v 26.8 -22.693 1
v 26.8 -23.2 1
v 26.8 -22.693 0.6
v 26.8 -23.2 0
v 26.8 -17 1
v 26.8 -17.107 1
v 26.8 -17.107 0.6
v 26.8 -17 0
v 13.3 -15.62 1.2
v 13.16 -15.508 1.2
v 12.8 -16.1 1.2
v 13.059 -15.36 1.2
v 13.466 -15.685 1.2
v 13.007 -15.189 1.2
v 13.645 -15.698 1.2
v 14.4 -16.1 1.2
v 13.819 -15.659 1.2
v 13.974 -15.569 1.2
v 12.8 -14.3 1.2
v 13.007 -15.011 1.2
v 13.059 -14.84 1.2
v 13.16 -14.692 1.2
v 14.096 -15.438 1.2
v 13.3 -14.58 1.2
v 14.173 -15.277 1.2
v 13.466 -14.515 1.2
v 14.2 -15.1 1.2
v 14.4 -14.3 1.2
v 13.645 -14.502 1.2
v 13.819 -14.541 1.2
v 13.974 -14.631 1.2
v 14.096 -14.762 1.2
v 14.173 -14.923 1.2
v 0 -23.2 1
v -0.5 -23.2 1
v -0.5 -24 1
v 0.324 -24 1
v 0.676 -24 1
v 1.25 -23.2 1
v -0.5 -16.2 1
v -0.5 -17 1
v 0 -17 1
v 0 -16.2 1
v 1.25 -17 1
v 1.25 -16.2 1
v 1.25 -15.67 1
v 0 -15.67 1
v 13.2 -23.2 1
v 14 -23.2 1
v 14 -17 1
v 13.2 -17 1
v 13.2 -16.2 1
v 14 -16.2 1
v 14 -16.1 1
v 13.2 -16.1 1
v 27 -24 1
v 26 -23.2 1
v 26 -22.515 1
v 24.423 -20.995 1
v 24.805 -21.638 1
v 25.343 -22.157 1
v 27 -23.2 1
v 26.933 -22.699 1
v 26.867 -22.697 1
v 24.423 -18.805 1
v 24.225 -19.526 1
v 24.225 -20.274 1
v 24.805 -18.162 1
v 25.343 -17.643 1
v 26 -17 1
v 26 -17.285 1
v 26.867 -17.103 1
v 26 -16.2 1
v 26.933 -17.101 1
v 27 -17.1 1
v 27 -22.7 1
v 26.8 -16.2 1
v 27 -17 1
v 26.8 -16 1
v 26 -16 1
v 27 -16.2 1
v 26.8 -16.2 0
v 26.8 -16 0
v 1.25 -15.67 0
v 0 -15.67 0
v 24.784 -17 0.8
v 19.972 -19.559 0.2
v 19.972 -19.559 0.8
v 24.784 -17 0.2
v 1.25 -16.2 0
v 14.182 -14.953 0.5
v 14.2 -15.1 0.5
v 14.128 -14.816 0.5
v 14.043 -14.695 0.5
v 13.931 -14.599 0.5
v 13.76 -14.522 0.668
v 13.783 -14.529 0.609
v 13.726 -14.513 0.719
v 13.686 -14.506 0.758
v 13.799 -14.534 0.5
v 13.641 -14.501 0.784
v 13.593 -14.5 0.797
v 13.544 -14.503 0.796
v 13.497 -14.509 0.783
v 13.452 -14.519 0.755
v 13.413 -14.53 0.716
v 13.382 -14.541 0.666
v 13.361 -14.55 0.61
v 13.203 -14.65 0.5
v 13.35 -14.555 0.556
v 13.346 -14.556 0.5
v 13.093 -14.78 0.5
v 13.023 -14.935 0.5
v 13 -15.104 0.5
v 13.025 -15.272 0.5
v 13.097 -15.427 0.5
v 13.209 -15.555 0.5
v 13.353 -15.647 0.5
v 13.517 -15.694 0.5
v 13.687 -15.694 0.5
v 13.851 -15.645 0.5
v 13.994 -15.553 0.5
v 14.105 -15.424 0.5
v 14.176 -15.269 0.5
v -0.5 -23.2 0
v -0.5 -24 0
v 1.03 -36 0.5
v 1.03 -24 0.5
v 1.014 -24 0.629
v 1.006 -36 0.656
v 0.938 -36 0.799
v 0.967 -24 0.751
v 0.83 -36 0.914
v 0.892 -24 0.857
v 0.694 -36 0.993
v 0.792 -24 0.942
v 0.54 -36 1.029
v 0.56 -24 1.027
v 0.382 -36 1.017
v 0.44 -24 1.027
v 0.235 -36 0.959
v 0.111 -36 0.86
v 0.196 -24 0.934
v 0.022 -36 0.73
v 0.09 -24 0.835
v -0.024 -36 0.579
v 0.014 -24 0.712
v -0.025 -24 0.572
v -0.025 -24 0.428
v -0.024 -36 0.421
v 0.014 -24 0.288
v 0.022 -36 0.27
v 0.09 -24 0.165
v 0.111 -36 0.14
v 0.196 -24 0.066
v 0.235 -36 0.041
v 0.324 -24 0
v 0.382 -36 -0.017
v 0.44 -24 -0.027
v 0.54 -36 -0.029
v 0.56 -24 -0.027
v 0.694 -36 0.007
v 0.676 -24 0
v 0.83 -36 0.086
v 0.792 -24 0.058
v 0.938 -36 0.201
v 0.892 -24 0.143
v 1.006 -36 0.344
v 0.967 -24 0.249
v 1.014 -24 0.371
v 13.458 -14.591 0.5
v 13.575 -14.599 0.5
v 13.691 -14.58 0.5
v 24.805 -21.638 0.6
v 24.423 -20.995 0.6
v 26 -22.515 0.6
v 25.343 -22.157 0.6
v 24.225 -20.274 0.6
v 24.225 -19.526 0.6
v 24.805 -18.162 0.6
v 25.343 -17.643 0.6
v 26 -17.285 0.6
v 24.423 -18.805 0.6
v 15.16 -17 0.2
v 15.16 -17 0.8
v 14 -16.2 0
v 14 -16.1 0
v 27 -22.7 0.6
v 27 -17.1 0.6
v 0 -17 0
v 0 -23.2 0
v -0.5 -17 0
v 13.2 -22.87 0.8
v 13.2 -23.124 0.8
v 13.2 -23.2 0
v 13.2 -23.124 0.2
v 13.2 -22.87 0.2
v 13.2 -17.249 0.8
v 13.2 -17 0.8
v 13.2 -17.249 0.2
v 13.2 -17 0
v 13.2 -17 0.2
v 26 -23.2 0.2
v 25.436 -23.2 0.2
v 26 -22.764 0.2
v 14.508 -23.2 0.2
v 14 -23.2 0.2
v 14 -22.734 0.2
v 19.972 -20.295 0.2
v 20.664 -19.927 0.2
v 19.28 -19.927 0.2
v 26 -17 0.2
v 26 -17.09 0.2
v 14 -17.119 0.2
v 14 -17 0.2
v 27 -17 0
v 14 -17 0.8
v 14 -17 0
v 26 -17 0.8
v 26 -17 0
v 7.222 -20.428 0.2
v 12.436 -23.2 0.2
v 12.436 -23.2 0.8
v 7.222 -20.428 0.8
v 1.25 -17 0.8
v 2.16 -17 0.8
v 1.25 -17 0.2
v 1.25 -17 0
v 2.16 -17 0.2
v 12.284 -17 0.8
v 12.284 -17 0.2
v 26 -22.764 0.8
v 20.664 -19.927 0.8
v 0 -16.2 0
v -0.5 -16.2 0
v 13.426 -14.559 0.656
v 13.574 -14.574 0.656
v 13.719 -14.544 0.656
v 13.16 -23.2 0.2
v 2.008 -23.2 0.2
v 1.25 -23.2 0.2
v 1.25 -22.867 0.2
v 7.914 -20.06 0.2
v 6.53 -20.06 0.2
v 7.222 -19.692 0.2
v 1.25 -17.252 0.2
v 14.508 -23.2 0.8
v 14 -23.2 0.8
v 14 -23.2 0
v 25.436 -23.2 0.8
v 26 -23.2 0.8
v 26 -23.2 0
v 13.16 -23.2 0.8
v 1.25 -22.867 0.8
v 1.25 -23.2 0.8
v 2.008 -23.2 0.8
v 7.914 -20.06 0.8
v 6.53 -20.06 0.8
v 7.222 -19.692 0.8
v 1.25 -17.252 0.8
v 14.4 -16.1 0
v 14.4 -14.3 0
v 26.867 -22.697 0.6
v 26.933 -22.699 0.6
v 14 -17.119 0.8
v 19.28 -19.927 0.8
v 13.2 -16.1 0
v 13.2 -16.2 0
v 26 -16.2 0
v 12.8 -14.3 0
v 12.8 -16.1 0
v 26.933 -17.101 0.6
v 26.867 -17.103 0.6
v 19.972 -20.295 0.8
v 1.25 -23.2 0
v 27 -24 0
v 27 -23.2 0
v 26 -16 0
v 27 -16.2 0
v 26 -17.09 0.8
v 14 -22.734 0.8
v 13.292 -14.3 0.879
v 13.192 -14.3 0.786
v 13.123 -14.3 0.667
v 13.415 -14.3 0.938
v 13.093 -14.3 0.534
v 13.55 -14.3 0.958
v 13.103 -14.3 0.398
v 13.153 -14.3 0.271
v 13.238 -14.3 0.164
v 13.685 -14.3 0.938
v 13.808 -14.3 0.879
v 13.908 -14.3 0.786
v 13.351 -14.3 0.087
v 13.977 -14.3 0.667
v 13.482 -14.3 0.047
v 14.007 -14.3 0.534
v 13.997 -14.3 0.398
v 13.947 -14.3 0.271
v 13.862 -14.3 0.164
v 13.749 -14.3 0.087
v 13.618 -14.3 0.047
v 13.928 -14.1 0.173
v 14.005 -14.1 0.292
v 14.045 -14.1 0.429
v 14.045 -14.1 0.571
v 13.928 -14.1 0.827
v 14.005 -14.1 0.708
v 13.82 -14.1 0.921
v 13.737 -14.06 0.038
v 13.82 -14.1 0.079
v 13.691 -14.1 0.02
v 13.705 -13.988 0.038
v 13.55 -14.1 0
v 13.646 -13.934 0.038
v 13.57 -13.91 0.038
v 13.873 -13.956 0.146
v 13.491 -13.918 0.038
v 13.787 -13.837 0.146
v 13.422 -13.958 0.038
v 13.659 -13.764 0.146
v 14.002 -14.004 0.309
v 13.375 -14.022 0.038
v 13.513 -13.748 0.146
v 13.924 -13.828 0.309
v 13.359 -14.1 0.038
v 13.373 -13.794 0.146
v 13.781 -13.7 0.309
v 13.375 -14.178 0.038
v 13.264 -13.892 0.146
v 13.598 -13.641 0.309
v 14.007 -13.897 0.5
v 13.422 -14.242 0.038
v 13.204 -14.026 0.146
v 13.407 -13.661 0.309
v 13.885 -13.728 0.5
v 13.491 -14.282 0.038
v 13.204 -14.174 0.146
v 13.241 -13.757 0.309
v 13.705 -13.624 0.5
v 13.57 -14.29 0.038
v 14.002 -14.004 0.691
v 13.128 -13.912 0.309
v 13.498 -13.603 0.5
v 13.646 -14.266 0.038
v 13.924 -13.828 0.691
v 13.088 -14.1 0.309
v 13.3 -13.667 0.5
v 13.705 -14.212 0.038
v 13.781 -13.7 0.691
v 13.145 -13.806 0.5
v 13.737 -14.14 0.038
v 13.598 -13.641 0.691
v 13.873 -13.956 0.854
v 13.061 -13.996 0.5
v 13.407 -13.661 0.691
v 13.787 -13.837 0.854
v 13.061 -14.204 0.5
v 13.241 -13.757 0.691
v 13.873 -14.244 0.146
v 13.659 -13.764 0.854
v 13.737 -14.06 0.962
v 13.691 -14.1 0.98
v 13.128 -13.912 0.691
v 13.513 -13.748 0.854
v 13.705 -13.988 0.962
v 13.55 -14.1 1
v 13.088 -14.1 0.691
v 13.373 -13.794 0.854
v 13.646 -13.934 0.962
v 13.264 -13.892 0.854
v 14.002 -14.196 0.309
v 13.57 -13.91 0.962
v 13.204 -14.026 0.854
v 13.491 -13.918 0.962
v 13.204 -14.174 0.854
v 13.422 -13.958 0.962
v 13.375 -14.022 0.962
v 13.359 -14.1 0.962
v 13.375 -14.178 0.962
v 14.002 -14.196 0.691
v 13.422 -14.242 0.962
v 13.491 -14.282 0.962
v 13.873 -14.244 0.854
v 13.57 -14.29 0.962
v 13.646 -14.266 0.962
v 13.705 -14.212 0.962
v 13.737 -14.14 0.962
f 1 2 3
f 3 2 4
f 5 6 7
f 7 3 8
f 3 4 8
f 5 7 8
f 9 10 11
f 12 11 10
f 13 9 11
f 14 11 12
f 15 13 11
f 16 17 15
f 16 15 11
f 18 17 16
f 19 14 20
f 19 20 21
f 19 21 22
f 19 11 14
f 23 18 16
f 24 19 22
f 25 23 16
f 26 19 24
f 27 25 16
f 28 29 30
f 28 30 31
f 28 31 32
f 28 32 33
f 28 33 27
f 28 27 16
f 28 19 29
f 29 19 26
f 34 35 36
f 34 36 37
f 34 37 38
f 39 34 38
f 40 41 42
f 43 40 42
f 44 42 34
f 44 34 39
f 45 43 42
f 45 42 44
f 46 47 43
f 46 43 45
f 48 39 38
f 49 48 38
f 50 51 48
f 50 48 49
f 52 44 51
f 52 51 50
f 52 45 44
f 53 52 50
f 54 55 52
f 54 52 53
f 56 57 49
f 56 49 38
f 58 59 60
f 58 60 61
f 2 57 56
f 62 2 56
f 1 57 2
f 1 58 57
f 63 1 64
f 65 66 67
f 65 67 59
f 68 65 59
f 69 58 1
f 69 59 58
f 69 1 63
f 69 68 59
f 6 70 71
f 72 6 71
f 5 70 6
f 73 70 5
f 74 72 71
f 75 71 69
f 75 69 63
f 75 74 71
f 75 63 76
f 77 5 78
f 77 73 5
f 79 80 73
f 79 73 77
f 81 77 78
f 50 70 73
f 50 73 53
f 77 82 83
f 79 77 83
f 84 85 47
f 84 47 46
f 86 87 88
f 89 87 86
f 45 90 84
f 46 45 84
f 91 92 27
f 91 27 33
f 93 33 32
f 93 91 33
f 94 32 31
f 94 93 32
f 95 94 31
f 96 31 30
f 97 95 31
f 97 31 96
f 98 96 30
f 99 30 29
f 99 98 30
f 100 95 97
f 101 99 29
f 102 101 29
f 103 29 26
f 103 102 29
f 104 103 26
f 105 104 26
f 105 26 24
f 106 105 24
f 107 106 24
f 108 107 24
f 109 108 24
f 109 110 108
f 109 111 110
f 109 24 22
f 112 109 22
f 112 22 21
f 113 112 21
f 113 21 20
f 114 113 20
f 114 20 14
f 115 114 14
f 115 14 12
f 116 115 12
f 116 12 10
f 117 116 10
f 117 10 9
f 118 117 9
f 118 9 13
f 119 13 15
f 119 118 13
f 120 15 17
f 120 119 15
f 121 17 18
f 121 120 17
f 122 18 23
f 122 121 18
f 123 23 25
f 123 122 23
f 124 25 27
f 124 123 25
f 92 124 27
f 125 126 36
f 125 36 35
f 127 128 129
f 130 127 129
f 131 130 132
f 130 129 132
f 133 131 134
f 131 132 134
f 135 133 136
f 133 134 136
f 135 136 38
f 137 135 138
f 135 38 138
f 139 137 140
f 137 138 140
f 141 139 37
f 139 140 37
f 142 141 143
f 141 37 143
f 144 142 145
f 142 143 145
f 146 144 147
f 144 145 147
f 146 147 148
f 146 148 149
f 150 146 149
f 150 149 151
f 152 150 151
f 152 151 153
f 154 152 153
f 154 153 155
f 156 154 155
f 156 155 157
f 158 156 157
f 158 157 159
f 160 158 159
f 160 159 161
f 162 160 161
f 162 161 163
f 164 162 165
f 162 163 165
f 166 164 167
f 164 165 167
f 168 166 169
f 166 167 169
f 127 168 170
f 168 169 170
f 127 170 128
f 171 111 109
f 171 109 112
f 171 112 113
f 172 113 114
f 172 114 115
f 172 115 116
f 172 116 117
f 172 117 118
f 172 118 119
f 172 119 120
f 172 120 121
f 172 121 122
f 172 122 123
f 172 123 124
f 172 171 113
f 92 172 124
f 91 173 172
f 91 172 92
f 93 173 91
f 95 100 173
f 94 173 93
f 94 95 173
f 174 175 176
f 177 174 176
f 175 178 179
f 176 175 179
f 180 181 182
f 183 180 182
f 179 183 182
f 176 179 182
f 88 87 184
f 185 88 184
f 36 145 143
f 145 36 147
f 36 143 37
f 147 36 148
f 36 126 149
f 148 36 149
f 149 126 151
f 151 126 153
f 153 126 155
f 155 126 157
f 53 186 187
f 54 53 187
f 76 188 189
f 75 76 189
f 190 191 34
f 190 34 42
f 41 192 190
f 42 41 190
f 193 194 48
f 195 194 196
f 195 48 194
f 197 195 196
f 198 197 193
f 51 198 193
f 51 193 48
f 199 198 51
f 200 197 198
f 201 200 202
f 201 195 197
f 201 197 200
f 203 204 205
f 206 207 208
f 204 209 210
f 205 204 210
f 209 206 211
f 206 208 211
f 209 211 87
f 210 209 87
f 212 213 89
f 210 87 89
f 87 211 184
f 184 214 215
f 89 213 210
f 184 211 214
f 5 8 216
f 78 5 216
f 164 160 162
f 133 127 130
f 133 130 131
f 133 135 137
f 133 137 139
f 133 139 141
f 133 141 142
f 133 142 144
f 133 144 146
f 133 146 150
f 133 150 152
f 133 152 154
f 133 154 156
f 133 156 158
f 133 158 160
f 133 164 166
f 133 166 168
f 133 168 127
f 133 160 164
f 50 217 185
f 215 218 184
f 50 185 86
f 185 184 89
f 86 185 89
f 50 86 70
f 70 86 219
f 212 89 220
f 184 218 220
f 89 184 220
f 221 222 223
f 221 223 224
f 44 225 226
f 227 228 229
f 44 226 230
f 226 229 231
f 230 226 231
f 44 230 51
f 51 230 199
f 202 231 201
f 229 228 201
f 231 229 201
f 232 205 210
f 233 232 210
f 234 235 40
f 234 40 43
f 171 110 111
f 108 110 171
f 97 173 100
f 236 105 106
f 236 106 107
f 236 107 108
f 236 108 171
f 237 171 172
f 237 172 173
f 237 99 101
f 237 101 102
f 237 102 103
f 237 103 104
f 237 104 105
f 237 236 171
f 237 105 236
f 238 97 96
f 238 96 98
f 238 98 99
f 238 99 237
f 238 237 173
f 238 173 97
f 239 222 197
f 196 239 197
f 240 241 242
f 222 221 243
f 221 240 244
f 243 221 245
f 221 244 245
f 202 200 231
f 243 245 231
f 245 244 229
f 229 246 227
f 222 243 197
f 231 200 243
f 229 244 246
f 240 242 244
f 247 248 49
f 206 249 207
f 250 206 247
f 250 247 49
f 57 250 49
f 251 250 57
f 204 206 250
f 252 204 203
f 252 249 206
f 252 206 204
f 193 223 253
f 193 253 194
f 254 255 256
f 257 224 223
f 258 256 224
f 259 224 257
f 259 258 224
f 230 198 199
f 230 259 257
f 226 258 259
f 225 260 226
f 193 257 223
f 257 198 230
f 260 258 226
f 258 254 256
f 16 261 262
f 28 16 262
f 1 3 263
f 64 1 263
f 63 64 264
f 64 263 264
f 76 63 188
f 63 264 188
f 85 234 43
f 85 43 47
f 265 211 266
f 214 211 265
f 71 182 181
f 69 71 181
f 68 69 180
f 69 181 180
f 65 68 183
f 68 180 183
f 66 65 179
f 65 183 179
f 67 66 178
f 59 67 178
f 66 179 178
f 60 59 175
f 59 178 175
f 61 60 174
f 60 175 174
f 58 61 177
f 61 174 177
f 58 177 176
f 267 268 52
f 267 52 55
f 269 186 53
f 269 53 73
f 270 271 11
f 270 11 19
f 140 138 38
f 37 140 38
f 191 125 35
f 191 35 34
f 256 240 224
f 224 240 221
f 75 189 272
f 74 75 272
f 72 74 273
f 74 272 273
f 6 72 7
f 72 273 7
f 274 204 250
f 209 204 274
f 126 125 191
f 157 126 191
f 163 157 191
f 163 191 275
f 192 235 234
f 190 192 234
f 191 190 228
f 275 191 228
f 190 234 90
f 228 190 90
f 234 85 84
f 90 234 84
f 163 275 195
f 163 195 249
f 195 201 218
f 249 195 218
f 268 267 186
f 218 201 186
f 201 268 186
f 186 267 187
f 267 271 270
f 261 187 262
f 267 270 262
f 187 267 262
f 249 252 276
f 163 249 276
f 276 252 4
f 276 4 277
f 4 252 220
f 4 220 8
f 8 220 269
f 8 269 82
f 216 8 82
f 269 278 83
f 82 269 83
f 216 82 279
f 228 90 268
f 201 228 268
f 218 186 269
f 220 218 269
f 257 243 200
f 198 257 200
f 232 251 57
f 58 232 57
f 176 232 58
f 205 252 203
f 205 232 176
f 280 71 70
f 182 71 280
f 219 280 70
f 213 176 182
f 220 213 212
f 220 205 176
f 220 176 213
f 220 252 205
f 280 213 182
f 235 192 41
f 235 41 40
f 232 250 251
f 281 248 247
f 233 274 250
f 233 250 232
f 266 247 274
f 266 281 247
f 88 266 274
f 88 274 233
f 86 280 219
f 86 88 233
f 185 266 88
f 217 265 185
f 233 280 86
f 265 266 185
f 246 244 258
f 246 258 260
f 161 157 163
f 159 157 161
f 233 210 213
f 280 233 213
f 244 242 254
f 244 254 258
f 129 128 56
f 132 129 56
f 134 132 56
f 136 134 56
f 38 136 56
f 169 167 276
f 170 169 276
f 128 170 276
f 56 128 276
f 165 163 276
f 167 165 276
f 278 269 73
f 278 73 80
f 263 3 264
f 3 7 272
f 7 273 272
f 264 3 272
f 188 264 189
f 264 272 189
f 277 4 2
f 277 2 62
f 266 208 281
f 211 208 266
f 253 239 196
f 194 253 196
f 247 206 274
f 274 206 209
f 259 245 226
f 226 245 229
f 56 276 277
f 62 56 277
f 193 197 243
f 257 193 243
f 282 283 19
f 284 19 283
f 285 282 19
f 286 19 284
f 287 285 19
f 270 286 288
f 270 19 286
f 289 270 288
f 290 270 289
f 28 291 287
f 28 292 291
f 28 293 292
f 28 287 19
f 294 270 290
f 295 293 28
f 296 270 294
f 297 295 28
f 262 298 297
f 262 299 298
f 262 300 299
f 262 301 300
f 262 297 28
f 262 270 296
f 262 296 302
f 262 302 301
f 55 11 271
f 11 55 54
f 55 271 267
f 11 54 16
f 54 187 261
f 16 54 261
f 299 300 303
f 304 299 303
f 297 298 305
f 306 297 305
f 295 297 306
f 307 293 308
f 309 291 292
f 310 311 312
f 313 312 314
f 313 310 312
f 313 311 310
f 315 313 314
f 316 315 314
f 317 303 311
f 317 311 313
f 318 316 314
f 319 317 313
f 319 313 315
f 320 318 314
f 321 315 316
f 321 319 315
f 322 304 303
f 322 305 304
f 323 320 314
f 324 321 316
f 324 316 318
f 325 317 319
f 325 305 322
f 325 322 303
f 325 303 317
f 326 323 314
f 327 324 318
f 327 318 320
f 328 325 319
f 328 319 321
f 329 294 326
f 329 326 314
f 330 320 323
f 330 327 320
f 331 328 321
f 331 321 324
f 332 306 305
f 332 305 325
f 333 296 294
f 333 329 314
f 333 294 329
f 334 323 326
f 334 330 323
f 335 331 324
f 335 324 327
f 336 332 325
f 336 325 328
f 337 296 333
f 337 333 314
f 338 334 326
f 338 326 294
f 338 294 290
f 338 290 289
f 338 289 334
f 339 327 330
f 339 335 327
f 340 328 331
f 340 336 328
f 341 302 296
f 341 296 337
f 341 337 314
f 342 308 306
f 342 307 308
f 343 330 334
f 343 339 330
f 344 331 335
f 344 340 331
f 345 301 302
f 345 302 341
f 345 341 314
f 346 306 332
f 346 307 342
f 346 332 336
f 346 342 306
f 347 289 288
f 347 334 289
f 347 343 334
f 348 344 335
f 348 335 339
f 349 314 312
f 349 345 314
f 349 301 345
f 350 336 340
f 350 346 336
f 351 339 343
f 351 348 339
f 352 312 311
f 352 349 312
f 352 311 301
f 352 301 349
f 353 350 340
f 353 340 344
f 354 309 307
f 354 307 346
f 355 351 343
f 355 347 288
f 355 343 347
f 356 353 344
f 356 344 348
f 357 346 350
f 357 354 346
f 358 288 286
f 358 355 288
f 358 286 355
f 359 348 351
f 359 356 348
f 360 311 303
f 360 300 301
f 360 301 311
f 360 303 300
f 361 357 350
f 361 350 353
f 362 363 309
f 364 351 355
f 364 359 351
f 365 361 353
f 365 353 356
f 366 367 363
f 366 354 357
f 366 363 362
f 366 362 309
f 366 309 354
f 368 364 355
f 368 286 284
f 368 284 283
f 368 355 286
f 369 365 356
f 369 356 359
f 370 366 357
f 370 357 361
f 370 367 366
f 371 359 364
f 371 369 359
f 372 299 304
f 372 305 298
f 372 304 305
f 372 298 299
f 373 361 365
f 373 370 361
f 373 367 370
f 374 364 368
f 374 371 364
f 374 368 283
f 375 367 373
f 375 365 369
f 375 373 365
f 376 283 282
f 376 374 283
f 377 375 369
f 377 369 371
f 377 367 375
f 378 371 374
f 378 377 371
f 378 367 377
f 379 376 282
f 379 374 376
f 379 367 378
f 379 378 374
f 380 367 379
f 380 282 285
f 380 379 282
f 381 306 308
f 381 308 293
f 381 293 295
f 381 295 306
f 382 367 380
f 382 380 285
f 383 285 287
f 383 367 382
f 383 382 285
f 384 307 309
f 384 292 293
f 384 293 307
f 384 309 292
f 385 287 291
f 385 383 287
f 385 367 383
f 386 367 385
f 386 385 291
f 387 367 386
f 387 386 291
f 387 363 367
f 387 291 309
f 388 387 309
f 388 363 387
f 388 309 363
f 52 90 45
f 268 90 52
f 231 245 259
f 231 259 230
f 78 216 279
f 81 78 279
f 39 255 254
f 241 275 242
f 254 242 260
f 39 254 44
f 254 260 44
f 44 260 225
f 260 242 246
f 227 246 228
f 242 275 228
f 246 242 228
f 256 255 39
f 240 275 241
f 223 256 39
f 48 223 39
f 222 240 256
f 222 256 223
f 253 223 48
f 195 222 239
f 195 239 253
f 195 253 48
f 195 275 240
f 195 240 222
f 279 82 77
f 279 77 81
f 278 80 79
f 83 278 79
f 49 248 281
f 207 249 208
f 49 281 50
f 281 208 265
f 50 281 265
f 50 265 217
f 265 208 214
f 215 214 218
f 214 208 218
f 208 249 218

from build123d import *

# Parameters (mm, degrees)
SKETCH003_W            = 1.25
SKETCH003_H            = 8.33
PAD003_DEPTH           = 1
BOX019_W               = 27.5
BOX019_H               = 0.8
BOX019_DEPTH           = 1
LINEARPATTERN009_COUNT = 2
LINEARPATTERN009_PITCH = 7
BOX022_W               = 0.8
BOX022_H               = 8
BOX022_DEPTH           = 1
BOX021_W               = 0.8
BOX021_H               = 8
BOX021_DEPTH           = 1
BOX020_W               = 0.65
BOX020_H               = 14
BOX020_DEPTH           = 0.6
LINEARPATTERN011_COUNT = 2
LINEARPATTERN011_PITCH = 12.5
BOX023_W               = 0.65
BOX023_H               = 14
BOX023_DEPTH           = 0.6
LINEARPATTERN010_COUNT = 2
LINEARPATTERN010_PITCH = 13
CYLINDER010_R          = 0.53
CYLINDER010_DEPTH      = 12
CYLINDER009_R          = 2.8
CYLINDER009_DEPTH      = 0.4
BOX025_W               = 1.6
BOX025_H               = 1.8
BOX025_DEPTH           = 1.2
CYLINDER011_R          = 0.6
CYLINDER011_DEPTH      = 2
BOX024_W               = 4
BOX024_H               = 6
BOX024_DEPTH           = 1


with BuildPart() as part:
    # Sketch003 → Pad003 (new body)
    with BuildSketch(Plane.XY):
        with Locations((0.625, 4.165)):
            Rectangle(SKETCH003_W, SKETCH003_H)
    extrude(amount=PAD003_DEPTH)

    # Box019 → Box019 (join)
    with BuildSketch(Plane(origin=(-0.5, 0, 0), x_dir=(1, 0, 0), z_dir=(0, 0, 1))):
        with Locations((13.75, 0.4)):
            Rectangle(BOX019_W, BOX019_H)
    box019 = extrude(amount=BOX019_DEPTH)

    # LinearPattern009: Box019 ×2
    with Locations(*[(0, i * LINEARPATTERN009_PITCH, 0) for i in range(1, LINEARPATTERN009_COUNT)]):
        add(box019)

    # Box022 → Box022 (join)
    with BuildSketch(Plane(origin=(13.2, 0, 0), x_dir=(1, 0, 0), z_dir=(0, 0, 1))):
        with Locations((0.4, 4)):
            Rectangle(BOX022_W, BOX022_H)
    extrude(amount=BOX022_DEPTH)

    # Box021 → Box021 (join)
    with BuildSketch(Plane(origin=(26, 0, 0), x_dir=(1, 0, 0), z_dir=(0, 0, 1))):
        with Locations((0.4, 4)):
            Rectangle(BOX021_W, BOX021_H)
    extrude(amount=BOX021_DEPTH)

    # Box020 → Box020 (join)
    with BuildSketch(Plane(origin=(1, 1, 0.2), x_dir=(0.469472, -0.882948, 0), z_dir=(0, 0, 1))):
        with Locations((0.325, 7)):
            Rectangle(BOX020_W, BOX020_H)
    box020 = extrude(amount=BOX020_DEPTH)

    # LinearPattern011: Box020 ×2
    with Locations(*[(i * LINEARPATTERN011_PITCH, 0, 0) for i in range(1, LINEARPATTERN011_COUNT)]):
        add(box020)

    # Box023 → Box023 (join)
    with BuildSketch(Plane(origin=(13, 0.5, 0.2), x_dir=(0.469472, 0.882948, 0), z_dir=(0, 0, 1))):
        with Locations((0.325, 7)):
            Rectangle(BOX023_W, BOX023_H)
    box023 = extrude(amount=BOX023_DEPTH)

    # LinearPattern010: Box023 ×2
    with Locations(*[(i * LINEARPATTERN010_PITCH, 0, 0) for i in range(1, LINEARPATTERN010_COUNT)]):
        add(box023)

    # Cylinder010 → Cylinder010 (join)
    with BuildSketch(Plane(origin=(0.5, 0, 0.5), x_dir=(1, 0, 0), z_dir=(0, -1, 0))):
        Circle(CYLINDER010_R)
    extrude(amount=CYLINDER010_DEPTH)

    # Cylinder009 → Cylinder009 (join)
    with BuildSketch(Plane(origin=(27, 4.1, 0.6), x_dir=(1, 0, 0), z_dir=(0, 0, 1))):
        Circle(CYLINDER009_R)
    extrude(amount=CYLINDER009_DEPTH)

    # Box025 → Box025 (join)
    with BuildSketch(Plane(origin=(12.8, 7.9, 0), x_dir=(1, 0, 0), z_dir=(0, 0, 1))):
        with Locations((0.8, 0.9)):
            Rectangle(BOX025_W, BOX025_H)
    extrude(amount=BOX025_DEPTH)

    # Cylinder011 → Cylinder011 (cut)
    with BuildSketch(Plane(origin=(13.6, 8.9, 0.5), x_dir=(1, 0, 0), z_dir=(0, 0, 1))):
        Circle(CYLINDER011_R)
    extrude(amount=CYLINDER011_DEPTH, mode=Mode.SUBTRACT)

    # Box024 → Box024 (cut)
    with BuildSketch(Plane(origin=(27, 1, 0), x_dir=(1, 0, 0), z_dir=(0, 0, 1))):
        with Locations((2, 3)):
            Rectangle(BOX024_W, BOX024_H)
    extrude(amount=BOX024_DEPTH, mode=Mode.SUBTRACT)

    # Sphere001 → Sphere001 (revolve)
    with BuildSketch(Plane(origin=(13.55, 9.9, 0.5), x_dir=(1, 0, 0), z_dir=(0, -1, 0))):
        with BuildLine():
            ThreePointArc((0, -0.5), (0.5, 0), (0, 0.5))
            Line((0, 0.5), (0, -0.5))
        make_face()
    revolve(axis=Axis((13.55, 9.9, 0.5), (0, 0, 1)))


with BuildPart() as part_1:
    # Body003 placement: moved
    add(part.part.moved(Location((0, -24, 0))))


solid = part_1.part
